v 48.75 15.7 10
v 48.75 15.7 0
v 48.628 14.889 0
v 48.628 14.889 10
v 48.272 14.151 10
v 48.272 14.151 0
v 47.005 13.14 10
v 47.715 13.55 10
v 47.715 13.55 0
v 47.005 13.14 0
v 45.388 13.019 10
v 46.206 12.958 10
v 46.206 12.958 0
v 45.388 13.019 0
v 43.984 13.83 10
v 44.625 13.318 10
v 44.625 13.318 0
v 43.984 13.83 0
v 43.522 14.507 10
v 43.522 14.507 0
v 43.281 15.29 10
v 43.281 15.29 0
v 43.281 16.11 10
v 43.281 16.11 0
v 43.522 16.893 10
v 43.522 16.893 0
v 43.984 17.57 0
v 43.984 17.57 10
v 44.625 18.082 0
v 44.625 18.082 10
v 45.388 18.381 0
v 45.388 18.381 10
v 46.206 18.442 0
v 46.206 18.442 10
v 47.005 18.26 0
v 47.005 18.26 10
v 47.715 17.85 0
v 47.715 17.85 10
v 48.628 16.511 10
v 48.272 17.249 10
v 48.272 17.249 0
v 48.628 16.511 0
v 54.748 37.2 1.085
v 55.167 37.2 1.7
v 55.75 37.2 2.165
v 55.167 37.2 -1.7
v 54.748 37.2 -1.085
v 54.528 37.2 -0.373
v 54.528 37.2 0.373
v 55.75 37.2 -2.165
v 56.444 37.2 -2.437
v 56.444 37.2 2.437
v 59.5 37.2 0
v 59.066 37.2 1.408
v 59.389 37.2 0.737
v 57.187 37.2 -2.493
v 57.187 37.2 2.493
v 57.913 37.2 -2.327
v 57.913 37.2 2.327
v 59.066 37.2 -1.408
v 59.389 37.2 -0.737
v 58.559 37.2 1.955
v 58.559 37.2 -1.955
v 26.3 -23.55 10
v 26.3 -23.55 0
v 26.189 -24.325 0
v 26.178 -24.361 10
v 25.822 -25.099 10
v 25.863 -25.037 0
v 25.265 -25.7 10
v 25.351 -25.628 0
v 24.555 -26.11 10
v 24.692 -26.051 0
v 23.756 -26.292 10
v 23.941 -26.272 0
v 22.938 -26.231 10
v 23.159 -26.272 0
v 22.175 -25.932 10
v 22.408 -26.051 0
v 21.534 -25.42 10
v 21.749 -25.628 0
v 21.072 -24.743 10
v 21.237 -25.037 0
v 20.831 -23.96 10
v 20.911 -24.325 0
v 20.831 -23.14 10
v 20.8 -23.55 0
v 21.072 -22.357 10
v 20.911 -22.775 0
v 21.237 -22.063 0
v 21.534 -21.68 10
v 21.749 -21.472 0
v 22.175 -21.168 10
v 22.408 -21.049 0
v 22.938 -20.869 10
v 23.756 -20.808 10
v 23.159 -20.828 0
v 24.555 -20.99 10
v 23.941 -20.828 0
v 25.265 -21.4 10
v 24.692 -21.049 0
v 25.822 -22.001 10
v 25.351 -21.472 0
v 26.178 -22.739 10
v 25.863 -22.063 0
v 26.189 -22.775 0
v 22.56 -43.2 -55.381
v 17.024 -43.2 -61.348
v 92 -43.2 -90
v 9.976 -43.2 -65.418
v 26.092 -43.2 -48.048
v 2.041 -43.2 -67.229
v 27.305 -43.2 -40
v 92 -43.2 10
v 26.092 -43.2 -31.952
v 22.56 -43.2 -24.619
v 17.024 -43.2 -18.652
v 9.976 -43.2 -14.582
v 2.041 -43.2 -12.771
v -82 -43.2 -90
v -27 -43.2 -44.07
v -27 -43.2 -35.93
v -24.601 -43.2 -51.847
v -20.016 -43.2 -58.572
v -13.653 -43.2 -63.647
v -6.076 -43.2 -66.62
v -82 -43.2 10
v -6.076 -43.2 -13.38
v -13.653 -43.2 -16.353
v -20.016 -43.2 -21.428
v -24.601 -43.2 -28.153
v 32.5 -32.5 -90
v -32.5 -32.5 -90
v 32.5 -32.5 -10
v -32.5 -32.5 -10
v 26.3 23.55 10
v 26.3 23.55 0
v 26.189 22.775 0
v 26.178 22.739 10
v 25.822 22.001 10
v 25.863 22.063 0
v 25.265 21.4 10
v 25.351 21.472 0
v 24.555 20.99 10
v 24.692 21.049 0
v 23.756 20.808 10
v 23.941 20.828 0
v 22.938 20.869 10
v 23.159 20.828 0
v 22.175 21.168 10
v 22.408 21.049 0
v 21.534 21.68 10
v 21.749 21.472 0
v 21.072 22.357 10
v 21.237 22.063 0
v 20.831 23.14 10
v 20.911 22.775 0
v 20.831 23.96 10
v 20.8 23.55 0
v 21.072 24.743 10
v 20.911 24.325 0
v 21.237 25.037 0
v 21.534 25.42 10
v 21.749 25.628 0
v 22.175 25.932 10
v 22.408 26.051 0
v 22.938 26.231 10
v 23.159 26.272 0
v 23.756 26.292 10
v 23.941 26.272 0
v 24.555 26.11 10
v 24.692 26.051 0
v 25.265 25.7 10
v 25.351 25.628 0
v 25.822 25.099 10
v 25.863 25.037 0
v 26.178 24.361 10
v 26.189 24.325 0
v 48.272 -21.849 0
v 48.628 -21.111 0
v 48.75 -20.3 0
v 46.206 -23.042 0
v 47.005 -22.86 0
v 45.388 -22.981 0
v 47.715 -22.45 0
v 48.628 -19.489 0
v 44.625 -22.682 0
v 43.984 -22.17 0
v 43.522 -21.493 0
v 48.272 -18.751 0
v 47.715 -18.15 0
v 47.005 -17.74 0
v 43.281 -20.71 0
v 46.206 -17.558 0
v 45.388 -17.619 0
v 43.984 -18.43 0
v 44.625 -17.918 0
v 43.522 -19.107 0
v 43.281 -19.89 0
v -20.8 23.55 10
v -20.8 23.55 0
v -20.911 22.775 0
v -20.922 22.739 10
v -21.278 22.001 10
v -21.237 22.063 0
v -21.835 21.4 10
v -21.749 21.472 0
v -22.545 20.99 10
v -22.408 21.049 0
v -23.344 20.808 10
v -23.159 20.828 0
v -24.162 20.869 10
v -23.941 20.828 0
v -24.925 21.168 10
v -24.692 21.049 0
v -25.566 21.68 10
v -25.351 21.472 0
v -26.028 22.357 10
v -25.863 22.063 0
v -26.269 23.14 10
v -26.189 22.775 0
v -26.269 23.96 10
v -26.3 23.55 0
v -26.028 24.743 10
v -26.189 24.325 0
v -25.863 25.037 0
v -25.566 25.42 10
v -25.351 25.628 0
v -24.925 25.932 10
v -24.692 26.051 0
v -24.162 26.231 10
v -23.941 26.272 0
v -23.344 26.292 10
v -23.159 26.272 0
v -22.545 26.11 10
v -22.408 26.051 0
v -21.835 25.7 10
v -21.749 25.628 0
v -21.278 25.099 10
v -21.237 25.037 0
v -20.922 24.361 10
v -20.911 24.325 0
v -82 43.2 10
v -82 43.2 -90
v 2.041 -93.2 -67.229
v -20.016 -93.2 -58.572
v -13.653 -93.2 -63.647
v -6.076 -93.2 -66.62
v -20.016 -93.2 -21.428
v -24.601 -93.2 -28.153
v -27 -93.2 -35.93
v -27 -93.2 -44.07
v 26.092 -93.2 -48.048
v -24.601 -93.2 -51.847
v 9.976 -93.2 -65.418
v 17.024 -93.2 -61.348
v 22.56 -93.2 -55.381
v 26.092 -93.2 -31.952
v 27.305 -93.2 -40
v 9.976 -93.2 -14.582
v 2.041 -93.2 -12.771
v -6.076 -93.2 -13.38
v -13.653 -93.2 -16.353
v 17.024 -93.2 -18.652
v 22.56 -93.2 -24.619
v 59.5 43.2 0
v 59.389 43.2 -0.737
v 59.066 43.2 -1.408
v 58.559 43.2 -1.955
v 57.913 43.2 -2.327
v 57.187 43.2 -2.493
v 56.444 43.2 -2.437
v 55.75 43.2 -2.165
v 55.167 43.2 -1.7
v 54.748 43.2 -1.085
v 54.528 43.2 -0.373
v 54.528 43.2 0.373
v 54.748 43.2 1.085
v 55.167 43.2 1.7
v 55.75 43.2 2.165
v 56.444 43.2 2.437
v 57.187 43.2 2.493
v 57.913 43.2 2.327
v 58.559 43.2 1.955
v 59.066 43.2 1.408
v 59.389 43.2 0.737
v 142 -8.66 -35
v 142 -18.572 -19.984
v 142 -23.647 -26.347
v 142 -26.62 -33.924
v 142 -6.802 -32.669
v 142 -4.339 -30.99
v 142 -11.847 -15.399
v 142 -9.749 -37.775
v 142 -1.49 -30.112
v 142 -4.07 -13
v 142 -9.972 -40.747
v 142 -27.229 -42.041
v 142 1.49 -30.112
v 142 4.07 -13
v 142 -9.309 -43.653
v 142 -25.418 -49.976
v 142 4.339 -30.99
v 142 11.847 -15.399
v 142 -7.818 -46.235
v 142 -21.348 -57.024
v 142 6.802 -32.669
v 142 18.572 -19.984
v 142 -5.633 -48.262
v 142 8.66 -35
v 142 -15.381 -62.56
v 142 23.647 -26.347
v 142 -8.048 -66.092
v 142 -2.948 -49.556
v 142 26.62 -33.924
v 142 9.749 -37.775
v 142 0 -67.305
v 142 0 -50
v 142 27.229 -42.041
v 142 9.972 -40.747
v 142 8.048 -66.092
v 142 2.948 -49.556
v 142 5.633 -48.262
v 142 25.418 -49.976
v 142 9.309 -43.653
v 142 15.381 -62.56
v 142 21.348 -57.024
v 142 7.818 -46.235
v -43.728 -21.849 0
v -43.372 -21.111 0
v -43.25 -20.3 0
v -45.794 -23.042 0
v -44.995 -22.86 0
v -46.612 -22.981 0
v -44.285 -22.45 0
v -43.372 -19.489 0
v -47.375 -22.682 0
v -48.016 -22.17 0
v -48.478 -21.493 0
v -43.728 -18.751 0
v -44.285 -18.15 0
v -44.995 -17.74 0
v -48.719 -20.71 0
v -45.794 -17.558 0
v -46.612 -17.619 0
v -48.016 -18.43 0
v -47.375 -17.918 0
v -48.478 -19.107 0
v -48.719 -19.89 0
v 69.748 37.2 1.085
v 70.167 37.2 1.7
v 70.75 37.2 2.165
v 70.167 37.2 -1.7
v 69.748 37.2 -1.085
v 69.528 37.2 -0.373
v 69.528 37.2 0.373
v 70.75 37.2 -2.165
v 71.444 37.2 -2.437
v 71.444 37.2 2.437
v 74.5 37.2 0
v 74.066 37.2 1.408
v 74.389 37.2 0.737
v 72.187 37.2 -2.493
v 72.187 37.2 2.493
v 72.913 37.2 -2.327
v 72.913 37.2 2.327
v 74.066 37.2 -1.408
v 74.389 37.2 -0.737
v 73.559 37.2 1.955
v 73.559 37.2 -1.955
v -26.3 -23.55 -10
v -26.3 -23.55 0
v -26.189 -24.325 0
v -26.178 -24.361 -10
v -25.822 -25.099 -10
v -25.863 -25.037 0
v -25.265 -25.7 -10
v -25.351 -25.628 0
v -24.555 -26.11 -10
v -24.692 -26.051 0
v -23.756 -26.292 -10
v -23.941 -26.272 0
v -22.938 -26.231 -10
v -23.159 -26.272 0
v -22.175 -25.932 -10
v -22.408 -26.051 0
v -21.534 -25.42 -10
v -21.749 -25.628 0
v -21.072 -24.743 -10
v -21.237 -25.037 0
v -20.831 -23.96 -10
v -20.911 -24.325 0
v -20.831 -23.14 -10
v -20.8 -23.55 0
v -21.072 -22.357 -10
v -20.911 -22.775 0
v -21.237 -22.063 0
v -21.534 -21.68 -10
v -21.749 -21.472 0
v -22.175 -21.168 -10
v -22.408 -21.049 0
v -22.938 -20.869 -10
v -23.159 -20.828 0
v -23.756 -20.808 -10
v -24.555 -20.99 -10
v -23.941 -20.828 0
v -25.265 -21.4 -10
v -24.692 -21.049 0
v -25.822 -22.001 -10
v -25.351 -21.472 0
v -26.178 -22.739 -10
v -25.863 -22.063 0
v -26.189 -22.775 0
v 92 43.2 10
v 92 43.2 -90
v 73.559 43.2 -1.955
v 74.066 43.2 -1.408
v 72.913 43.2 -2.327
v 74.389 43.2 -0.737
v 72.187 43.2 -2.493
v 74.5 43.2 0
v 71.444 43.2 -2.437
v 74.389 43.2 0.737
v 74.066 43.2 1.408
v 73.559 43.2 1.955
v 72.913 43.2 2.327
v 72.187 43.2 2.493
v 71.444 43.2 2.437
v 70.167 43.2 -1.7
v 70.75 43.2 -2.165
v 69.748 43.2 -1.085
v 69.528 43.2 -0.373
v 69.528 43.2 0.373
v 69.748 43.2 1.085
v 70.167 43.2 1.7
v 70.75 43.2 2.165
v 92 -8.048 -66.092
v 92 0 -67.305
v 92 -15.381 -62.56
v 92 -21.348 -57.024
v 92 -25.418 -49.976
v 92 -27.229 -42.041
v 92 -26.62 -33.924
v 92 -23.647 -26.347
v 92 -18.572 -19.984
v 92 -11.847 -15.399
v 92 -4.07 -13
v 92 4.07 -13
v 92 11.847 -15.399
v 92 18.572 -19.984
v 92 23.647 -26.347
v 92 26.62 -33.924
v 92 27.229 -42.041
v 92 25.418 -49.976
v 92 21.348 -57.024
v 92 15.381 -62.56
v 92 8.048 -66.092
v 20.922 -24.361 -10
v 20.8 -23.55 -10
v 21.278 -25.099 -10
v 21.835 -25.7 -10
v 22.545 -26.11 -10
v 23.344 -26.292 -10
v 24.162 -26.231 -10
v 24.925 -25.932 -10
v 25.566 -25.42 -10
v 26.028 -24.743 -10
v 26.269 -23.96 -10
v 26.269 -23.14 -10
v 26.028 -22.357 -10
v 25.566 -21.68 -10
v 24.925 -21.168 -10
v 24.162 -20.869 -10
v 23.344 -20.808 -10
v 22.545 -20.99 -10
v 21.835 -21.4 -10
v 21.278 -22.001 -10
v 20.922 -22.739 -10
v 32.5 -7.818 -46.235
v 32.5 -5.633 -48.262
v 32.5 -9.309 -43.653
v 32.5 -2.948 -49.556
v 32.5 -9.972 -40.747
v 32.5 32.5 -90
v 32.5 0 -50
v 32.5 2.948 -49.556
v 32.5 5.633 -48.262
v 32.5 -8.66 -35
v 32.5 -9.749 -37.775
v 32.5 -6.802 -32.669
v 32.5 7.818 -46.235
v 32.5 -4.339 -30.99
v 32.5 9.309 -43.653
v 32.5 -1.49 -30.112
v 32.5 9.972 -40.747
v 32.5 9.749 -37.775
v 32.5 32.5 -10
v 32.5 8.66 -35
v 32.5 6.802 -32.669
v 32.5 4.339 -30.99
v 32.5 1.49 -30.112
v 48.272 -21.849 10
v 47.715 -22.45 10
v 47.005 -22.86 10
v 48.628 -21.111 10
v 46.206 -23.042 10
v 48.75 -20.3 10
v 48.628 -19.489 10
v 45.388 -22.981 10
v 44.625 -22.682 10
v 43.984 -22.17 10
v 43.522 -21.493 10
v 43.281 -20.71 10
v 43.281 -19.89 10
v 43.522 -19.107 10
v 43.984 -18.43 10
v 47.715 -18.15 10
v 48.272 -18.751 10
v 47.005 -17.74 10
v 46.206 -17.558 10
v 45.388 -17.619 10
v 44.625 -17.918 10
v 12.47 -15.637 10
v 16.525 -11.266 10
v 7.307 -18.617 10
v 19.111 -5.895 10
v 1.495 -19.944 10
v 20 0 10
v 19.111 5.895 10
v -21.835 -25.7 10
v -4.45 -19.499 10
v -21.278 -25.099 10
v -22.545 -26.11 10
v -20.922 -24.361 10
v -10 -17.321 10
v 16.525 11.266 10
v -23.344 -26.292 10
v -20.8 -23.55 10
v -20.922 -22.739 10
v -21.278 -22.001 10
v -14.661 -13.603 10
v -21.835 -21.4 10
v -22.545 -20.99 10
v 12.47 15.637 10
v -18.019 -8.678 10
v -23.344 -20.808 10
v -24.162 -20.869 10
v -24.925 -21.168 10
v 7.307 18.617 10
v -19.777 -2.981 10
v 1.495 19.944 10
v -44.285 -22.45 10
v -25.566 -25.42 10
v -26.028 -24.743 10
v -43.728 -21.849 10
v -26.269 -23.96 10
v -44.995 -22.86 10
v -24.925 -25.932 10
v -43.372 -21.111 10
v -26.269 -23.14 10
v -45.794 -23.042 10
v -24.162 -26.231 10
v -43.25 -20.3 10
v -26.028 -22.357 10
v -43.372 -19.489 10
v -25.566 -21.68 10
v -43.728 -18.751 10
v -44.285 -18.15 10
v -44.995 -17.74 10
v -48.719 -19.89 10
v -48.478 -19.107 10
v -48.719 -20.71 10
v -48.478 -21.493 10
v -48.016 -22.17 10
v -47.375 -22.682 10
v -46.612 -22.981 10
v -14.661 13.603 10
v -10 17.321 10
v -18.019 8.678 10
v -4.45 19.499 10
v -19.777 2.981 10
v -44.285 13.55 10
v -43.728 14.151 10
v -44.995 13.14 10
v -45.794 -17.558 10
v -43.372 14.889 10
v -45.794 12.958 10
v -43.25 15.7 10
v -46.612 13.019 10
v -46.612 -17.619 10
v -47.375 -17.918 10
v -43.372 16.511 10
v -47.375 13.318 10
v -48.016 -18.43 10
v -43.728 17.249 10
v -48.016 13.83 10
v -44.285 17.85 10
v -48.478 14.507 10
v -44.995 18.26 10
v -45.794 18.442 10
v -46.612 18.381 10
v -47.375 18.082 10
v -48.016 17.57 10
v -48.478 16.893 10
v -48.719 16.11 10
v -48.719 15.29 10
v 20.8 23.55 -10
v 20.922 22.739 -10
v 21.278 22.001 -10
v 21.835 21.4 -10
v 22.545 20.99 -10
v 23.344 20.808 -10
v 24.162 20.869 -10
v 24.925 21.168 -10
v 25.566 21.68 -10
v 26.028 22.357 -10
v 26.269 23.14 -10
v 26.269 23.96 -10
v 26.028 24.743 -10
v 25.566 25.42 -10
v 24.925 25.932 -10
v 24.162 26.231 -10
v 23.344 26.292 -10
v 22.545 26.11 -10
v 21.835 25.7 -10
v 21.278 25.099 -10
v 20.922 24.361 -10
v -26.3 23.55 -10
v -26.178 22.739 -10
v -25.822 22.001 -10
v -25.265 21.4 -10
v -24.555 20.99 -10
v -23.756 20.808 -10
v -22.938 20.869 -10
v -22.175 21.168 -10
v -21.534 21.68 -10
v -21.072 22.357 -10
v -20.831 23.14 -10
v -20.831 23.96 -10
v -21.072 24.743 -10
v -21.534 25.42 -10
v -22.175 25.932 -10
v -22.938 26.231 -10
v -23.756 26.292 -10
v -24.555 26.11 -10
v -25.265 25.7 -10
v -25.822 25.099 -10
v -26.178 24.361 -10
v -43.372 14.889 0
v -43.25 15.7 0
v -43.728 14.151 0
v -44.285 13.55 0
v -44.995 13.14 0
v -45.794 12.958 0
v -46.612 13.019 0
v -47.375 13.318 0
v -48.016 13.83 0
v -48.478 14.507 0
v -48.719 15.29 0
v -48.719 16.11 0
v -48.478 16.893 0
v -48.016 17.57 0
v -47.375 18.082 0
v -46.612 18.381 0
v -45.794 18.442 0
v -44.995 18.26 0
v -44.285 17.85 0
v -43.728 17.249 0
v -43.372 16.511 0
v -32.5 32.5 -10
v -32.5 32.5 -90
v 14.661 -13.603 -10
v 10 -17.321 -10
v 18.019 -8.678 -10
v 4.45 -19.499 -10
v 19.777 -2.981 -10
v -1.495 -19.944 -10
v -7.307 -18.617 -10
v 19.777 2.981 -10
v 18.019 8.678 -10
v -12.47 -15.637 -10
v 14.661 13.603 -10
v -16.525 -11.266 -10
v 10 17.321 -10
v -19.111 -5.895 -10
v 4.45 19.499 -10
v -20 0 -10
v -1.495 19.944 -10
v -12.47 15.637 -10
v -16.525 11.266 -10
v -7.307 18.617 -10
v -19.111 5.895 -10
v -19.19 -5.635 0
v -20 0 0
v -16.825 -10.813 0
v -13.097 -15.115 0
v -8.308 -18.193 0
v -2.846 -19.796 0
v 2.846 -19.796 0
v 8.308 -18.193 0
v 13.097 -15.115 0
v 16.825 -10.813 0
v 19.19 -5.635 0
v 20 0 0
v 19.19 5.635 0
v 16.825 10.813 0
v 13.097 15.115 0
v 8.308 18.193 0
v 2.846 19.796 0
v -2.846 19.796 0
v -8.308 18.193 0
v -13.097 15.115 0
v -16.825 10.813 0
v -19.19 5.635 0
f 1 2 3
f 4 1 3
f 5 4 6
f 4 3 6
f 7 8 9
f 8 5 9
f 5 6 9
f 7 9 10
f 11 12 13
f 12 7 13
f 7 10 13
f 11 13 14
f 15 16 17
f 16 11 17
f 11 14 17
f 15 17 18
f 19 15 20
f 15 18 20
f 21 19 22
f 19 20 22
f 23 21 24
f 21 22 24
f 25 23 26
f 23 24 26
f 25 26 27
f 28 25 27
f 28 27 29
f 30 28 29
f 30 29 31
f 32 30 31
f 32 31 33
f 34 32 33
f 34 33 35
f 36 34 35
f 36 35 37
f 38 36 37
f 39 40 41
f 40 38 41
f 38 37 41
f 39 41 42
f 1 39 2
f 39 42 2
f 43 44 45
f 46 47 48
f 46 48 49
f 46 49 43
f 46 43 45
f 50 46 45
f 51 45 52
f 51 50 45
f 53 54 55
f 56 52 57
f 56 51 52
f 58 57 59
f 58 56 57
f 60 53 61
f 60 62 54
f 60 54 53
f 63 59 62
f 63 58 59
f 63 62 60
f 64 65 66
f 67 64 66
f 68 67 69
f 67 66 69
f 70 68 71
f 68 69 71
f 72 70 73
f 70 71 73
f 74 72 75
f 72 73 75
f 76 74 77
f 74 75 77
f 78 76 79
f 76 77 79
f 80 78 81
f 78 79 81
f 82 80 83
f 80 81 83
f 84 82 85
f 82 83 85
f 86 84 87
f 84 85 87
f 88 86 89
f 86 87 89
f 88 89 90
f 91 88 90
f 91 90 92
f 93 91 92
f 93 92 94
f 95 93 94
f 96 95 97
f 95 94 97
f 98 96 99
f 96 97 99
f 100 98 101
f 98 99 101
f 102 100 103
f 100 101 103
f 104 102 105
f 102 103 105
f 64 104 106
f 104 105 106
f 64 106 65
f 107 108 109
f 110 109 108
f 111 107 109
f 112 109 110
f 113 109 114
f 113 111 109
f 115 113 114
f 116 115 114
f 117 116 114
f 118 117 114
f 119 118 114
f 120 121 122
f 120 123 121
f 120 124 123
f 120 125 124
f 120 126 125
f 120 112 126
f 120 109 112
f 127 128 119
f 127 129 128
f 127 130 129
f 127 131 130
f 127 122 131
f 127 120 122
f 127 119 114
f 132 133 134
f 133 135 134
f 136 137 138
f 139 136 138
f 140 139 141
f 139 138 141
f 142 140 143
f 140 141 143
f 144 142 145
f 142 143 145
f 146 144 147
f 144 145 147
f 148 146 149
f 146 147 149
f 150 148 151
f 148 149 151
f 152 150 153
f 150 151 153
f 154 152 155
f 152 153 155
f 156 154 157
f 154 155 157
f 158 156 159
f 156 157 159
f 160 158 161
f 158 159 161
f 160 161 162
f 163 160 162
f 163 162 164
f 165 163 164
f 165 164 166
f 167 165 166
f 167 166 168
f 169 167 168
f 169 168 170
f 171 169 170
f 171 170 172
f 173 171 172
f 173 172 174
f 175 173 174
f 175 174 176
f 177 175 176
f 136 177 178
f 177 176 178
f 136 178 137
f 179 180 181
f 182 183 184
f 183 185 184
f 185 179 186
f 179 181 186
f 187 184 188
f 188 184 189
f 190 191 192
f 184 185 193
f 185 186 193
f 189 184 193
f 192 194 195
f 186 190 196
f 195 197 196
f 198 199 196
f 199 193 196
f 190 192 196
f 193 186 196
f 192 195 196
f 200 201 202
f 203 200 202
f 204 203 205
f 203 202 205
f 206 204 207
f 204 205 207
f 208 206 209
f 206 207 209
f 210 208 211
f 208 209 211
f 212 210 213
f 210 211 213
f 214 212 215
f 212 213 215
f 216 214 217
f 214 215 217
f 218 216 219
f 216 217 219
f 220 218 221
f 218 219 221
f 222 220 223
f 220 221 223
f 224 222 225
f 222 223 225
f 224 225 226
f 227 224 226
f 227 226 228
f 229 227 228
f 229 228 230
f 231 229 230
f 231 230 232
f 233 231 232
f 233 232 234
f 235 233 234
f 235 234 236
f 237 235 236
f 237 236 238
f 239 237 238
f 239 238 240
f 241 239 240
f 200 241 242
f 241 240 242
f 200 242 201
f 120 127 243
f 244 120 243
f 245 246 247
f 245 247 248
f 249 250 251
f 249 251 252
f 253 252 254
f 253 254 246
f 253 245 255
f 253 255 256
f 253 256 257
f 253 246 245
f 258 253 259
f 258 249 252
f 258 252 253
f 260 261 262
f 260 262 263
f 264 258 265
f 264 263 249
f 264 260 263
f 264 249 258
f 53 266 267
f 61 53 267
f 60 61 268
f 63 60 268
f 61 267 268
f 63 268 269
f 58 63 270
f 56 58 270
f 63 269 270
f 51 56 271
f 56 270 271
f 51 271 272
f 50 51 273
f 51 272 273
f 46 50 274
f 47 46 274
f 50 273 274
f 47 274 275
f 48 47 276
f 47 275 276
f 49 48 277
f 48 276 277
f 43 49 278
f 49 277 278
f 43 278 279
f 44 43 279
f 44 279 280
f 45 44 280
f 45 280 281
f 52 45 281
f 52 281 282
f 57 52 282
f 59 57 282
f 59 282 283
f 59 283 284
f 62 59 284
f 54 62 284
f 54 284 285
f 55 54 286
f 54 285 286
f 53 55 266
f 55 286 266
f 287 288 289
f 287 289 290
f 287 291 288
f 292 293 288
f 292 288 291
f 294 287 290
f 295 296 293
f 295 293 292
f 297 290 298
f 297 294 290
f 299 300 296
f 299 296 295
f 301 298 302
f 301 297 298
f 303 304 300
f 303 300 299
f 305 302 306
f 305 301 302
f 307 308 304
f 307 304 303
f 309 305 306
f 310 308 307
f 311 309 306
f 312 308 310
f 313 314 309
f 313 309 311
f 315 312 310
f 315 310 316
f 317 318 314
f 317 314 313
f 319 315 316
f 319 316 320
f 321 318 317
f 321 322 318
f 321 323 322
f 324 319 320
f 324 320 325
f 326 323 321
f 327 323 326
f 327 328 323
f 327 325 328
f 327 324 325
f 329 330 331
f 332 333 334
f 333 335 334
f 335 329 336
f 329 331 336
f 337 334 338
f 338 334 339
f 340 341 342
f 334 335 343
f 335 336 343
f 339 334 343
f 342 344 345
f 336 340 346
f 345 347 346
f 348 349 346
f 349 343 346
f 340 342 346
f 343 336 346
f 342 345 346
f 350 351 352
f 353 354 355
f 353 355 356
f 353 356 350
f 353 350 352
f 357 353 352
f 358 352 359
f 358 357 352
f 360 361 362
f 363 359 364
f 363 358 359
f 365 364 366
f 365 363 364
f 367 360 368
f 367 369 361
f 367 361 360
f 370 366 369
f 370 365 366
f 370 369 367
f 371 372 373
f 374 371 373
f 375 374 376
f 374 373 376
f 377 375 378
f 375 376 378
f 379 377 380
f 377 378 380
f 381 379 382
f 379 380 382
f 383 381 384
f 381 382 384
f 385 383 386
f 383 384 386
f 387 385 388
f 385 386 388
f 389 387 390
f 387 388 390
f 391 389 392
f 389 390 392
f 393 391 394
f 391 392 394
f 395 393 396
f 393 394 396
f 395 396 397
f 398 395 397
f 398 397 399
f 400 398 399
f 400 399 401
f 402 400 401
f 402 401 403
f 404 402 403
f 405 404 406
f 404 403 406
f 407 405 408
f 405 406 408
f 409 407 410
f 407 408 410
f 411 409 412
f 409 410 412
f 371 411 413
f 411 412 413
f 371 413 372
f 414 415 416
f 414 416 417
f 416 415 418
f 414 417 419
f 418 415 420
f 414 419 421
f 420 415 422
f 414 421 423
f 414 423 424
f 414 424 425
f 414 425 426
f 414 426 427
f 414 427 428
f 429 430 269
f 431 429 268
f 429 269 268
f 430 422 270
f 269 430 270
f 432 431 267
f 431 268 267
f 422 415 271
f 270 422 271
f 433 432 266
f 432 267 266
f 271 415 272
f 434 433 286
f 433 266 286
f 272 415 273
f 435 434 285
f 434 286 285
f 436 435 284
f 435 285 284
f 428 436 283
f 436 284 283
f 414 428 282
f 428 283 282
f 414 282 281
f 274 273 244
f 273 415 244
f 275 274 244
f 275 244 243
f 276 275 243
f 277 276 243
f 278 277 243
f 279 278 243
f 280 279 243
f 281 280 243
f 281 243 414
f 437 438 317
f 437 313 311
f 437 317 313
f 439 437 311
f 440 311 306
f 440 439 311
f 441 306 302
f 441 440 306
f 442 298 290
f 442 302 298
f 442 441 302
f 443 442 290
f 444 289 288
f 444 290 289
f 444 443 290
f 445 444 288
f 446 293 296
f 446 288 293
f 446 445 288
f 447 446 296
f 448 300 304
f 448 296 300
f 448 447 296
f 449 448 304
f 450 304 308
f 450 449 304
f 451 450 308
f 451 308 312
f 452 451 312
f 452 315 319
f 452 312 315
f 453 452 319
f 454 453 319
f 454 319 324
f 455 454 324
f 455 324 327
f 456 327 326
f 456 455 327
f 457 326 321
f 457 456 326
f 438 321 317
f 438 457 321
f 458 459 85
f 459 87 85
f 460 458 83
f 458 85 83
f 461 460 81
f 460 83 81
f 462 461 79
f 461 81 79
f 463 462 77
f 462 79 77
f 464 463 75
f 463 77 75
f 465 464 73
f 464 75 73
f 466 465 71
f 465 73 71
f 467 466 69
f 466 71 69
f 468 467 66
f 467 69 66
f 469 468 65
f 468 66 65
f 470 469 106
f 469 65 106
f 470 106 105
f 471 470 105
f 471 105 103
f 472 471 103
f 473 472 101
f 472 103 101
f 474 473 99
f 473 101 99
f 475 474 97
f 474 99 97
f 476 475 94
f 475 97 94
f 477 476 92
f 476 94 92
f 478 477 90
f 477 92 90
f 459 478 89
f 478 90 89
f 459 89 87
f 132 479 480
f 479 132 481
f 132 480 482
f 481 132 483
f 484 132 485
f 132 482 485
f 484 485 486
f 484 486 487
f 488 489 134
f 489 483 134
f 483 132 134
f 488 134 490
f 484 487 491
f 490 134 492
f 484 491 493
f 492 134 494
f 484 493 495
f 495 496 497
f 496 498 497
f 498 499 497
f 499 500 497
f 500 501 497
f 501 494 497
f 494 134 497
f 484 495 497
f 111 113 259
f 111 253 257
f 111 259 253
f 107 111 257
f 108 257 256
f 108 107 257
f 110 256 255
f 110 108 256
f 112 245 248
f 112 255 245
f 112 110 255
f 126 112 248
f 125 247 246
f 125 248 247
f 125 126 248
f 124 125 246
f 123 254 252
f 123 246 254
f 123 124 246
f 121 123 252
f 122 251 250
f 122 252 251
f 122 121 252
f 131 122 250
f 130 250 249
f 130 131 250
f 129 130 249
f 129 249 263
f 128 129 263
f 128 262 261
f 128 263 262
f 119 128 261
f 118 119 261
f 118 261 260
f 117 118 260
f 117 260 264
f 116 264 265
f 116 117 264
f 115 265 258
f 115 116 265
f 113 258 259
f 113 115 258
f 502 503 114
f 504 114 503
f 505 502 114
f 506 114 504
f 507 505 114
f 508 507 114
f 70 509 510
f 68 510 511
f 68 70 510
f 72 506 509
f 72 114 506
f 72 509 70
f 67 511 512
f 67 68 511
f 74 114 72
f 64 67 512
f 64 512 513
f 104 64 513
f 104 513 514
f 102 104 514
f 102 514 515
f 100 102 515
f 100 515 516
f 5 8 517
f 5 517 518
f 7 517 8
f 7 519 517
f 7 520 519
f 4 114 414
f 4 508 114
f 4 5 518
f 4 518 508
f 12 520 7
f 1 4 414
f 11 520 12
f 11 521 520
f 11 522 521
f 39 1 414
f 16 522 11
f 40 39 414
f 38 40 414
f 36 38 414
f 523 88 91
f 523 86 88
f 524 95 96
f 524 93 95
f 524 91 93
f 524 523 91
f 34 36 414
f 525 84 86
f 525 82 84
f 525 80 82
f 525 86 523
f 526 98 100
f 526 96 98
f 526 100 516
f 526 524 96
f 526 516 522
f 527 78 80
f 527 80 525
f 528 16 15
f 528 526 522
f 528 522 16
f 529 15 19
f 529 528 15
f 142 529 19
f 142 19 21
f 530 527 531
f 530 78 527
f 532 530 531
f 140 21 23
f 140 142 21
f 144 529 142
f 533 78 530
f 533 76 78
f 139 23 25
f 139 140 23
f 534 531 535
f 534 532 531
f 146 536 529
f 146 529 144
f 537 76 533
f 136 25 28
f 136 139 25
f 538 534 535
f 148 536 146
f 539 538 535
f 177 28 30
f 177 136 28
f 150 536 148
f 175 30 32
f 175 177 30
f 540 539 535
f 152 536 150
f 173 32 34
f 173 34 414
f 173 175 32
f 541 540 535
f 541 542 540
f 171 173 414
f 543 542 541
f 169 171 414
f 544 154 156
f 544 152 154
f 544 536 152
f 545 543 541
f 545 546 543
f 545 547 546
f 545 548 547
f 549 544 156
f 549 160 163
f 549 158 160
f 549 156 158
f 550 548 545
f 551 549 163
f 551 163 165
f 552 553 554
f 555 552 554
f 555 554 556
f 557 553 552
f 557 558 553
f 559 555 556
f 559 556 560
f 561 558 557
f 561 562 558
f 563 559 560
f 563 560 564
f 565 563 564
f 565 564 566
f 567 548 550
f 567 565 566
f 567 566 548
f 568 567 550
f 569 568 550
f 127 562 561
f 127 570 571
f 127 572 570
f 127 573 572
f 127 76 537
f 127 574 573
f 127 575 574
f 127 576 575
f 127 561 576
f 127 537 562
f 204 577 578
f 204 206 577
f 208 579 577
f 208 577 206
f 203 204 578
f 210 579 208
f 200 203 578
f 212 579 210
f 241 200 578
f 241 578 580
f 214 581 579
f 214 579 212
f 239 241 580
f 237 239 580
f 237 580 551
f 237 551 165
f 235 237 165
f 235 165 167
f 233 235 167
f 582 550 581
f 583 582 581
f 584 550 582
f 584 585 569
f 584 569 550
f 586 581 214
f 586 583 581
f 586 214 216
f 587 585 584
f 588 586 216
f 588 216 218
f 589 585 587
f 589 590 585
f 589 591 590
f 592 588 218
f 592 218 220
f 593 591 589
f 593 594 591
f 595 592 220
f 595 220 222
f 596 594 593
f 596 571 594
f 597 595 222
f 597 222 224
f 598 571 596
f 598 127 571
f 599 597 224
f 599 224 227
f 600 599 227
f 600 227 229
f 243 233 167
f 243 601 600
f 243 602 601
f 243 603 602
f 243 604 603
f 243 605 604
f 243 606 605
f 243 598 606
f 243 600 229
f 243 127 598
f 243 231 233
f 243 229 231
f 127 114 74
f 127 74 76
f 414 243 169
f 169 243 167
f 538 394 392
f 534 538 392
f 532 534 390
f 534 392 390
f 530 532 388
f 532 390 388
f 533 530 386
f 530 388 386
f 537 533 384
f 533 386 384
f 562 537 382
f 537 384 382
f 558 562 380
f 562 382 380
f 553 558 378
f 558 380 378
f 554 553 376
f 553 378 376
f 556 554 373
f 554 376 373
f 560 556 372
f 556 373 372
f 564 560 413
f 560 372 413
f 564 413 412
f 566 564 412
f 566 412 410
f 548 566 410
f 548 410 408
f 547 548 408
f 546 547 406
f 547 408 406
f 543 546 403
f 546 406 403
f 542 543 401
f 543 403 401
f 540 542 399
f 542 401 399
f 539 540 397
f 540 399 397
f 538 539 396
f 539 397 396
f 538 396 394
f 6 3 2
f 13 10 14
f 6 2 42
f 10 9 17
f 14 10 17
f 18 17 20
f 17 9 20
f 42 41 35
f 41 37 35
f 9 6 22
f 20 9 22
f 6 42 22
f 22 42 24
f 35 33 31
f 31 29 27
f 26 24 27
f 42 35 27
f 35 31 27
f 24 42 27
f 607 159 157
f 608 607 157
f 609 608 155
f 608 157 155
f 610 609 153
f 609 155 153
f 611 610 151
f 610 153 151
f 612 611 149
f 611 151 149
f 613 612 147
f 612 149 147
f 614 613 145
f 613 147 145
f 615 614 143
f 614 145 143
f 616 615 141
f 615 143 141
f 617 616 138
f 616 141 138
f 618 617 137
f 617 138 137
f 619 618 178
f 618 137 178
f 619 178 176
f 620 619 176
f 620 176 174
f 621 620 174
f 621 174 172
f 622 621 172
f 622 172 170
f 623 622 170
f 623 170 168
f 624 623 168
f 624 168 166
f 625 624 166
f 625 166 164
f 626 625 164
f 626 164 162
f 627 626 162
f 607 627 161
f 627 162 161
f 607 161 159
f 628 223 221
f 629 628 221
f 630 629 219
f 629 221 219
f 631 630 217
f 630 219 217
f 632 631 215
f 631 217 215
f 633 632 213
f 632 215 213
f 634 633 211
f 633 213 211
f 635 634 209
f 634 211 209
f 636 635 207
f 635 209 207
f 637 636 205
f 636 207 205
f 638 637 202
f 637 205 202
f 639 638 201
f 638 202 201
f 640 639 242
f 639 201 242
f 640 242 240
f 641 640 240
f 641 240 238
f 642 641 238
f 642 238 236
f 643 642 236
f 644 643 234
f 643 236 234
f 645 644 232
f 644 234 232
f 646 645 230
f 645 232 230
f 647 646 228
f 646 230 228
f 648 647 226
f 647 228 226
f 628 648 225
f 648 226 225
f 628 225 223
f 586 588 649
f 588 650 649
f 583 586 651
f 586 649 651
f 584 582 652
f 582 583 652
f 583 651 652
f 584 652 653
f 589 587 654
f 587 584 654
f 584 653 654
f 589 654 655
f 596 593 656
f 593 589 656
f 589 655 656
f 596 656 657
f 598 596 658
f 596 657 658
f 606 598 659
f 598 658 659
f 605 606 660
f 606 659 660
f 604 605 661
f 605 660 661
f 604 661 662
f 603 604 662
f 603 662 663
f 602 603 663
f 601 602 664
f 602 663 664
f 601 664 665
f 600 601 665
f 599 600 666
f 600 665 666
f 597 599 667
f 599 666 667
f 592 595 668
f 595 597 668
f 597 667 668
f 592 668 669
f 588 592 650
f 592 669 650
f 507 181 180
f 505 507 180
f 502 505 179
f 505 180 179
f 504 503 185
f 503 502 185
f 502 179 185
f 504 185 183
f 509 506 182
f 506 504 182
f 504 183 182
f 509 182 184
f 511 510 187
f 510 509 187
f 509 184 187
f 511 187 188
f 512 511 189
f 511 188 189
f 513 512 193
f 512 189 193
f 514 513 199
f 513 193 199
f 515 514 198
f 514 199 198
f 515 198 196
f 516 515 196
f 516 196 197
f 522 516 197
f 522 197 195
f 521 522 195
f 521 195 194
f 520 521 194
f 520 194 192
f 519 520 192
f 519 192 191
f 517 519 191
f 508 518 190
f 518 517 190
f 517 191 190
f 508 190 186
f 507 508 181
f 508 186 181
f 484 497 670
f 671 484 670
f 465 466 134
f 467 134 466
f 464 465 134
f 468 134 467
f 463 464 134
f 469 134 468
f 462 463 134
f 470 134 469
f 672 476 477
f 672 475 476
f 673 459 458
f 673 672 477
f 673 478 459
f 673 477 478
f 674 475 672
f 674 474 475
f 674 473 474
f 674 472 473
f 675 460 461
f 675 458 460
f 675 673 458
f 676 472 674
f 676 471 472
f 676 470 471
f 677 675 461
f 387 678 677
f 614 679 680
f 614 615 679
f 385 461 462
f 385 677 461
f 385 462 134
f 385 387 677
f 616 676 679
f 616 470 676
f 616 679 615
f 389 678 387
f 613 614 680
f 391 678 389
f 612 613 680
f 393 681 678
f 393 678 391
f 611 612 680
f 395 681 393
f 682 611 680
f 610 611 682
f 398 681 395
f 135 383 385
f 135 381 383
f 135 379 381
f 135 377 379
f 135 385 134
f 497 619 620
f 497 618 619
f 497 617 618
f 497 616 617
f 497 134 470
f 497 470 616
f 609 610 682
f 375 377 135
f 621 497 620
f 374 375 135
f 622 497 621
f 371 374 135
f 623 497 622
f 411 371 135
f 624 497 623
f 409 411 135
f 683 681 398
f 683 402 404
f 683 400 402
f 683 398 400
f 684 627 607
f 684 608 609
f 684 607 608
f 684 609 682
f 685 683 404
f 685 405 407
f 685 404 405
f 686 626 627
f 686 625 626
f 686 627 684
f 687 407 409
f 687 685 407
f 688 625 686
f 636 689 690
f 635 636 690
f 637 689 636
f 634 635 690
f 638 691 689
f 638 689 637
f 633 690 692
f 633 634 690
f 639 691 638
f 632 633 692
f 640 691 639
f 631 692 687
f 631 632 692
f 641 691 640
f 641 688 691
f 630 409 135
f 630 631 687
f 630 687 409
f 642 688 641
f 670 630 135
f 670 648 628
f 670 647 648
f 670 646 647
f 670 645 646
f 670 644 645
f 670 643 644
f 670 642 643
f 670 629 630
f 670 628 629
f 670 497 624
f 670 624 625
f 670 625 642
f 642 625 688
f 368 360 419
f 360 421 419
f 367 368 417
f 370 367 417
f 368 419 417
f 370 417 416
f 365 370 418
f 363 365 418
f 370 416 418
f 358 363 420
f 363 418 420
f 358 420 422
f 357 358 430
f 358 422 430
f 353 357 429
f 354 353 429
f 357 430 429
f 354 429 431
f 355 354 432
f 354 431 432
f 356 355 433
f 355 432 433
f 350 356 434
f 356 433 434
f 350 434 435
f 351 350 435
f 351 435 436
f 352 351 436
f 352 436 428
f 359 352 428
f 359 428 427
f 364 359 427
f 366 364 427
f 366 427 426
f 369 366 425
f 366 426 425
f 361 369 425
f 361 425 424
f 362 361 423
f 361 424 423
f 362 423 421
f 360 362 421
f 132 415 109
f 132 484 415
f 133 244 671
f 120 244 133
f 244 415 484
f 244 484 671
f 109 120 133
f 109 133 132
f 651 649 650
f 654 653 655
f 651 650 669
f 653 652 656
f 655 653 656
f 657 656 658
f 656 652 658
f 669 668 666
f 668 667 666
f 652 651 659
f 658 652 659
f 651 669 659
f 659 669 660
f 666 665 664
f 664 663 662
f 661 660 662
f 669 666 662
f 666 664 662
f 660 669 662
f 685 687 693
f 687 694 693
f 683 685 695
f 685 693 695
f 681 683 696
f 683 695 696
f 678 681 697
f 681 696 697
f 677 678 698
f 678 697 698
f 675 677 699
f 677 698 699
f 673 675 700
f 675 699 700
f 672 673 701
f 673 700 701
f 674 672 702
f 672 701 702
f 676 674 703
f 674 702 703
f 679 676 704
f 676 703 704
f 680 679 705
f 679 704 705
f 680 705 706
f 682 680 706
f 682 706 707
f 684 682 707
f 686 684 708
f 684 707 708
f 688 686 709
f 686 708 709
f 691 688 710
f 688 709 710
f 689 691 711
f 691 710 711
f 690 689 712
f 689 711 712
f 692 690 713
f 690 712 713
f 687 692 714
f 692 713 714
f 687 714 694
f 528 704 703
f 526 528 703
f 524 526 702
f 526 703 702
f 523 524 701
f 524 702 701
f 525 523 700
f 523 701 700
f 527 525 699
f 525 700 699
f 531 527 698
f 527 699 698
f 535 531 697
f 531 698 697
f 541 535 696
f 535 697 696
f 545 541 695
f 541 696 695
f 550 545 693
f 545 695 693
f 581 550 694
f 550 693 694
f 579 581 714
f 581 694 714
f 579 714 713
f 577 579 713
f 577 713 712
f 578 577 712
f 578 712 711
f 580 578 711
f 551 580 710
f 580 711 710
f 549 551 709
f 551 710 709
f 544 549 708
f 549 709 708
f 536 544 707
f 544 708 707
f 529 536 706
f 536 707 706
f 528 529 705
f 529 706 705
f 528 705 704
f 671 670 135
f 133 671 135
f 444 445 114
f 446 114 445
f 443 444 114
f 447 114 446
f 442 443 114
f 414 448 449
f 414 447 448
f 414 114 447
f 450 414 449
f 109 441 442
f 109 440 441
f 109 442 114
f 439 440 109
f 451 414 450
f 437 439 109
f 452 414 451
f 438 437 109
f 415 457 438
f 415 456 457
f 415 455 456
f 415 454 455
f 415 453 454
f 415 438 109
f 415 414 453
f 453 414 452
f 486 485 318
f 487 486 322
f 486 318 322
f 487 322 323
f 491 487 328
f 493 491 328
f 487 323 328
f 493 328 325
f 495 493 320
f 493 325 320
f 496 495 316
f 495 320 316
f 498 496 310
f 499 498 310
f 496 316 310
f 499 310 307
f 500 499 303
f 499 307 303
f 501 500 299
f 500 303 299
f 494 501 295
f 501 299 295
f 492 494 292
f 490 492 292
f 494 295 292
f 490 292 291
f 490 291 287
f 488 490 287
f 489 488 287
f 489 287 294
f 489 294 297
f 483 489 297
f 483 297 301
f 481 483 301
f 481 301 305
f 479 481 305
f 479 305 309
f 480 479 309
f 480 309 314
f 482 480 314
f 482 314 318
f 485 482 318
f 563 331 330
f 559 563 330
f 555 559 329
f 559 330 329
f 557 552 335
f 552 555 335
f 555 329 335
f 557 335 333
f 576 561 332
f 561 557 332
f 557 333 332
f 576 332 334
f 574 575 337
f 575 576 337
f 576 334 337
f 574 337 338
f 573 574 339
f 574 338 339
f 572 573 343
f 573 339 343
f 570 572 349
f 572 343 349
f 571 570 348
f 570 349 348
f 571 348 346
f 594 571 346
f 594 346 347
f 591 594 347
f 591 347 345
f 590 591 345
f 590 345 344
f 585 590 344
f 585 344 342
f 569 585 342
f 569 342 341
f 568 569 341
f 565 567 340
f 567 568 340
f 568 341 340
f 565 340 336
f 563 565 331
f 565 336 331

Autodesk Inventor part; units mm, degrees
ref_plane "YZ Plane" through (0, 0, 0) normal (1, 0, 0) x (0, 1, 0)
ref_plane "XZ Plane" through (0, 0, 0) normal (0, 1, 0) x (-1, 0, 0)
ref_plane "XY Plane" through (0, 0, 0) normal (0, 0, 1) x (1, 0, 0)
sketch "Sketch1" plane through (0, 0, 0) normal (0, 0, 1) x (1, 0, 0)
  line L0 (-23.55, 23.55) -> (23.55, 23.55) construction
  line L1 (23.55, 23.55) -> (23.55, -23.55) construction
  line L2 (23.55, -23.55) -> (-23.55, -23.55) construction
  line L3 (-23.55, -23.55) -> (-23.55, 23.55) construction
  line L4 (0, 23.55) -> (0, -23.55) construction
  line L5 (-23.55, 0) -> (23.55, 0) construction
  circle A0 centre (-23.55, 23.55) radius 2.75
  circle A1 centre (23.55, 23.55) radius 2.75
  circle A2 centre (-23.55, -23.55) radius 2.75
  circle A3 centre (23.55, -23.55) radius 2.75
  circle A4 centre (0, 0) radius 20
  line L6 (-28.2, 28.2) -> (28.2, 28.2) construction
  line L7 (28.2, 28.2) -> (28.2, -28.2) construction
  line L8 (28.2, -28.2) -> (-28.2, -28.2) construction
  line L9 (-28.2, -28.2) -> (-28.2, 28.2) construction
  line L10 (-28.2, 0) -> (28.2, 0) construction
  line L11 (0, -28.2) -> (0, 28.2) construction
  line L12 (-60, 21.2) -> (-32, 21.2) construction
  line L13 (-32, 21.2) -> (-32, -25.8) construction
  line L14 (-32, -25.8) -> (-60, -25.8) construction
  line L15 (-60, -25.8) -> (-60, 21.2) construction
  line L16 (-46, 21.2) -> (-46, -25.8) construction
  line L17 (-60, -2.3) -> (-32, -2.3) construction
  circle A5 centre (-46, 15.7) radius 2.75
  circle A6 centre (-46, -20.3) radius 2.75
  line L18 (60, 21.2) -> (32, 21.2) construction
  line L19 (32, 21.2) -> (32, -25.8) construction
  line L20 (32, -25.8) -> (60, -25.8) construction
  line L21 (60, -25.8) -> (60, 21.2) construction
  line L22 (46, 21.2) -> (46, -25.8) construction
  line L23 (60, -2.3) -> (32, -2.3) construction
  circle A7 centre (46, 15.7) radius 2.75
  circle A8 centre (46, -20.3) radius 2.75
  line L24 (-82, 43.2) -> (82, 43.2)
  line L25 (82, 43.2) -> (82, -43.2)
  line L26 (82, -43.2) -> (-82, -43.2)
  line L27 (-82, -43.2) -> (-82, 43.2)
  point P0 (0, 0)
  dimension "d0" = 47.1
  dimension "d1" = 47.1
  dimension "d2" = 5.5
  dimension "d4" = 40
  dimension "d5" = 56.4
  dimension "d6" = 56.4
  dimension "d9" = 46
  dimension "d10" = 47
  dimension "d11" = 28
  dimension "d12" = 5.5
  dimension "d13" = 36
  dimension "d14" = 22
  dimension "d15" = 15
  dimension "d18" = 2.3
extrude "Extrusion1" add sketch "Sketch1" along normal blind 10
sketch "Sketch2" plane through (0, 0, 0) normal (0, 0, -1) x (-1, 0, 0)
  line L0 (32.5, -32.5) -> (-32.5, -32.5)
  line L1 (-32.5, -32.5) -> (-32.5, 32.5)
  line L2 (-32.5, 32.5) -> (32.5, 32.5)
  line L3 (32.5, 32.5) -> (32.5, -32.5)
  line L4 (0, 32.5) -> (0, -32.5) construction
  line L5 (-32.5, 0) -> (32.5, 0) construction
  line L6 (-82, -43.2) -> (-82, 43.2) projected
  line L7 (82, -43.2) -> (-82, -43.2) projected
  line L8 (-82, 43.2) -> (82, 43.2)
  line L9 (82, 43.2) -> (82, -43.2)
  line L10 (82, -43.2) -> (-82, -43.2)
  line L11 (-82, -43.2) -> (-82, 43.2)
  point P0 (0, 0)
  point P1 (0, 0)
  dimension "d19" = 65
  dimension "d20" = 65
extrude "Extrusion2" add sketch "Sketch2" along normal blind 90
sketch "Sketch3" plane through (0, 0, 0) normal (0, 0, -1) x (-1, 0, 0)
  line L0 (32.5, -32.5) -> (32.5, 32.5) projected
  line L1 (32.5, 32.5) -> (-32.5, 32.5) projected
  line L2 (-32.5, 32.5) -> (-32.5, -32.5) projected
  line L3 (-32.5, -32.5) -> (32.5, -32.5) projected
  circle A0 centre (23.55, 23.55) radius 2.75 projected
  circle A1 centre (-23.55, 23.55) radius 2.75 projected
  circle A2 centre (23.55, -23.55) radius 2.75 projected
  circle A3 centre (-23.55, -23.55) radius 2.75 projected
  circle A4 centre (0, 0) radius 20 projected
extrude "Extrusion3" add sketch "Sketch3" along normal blind 10
sketch "Sketch8" plane through (82, -43.2, 10) normal (1, 0, 0) x (0, 0, -1)
  line L0 (100, 86.4) -> (0, 86.4) projected
  line L1 (0, 0) -> (0, 86.4) projected
  line L2 (100, 0) -> (0, 0) projected
  line L3 (100, 86.4) -> (100, 0) projected
  point P0 (10, 43.2)
extrude "Extrusion8" add sketch "Sketch8" along normal blind 10
sketch "Sketch9" plane through (92, -43.2, 10) normal (1, 0, 0) x (0, 0, -1)
  line L0 (100, 86.4) -> (0, 86.4) construction
  line L1 (50, 86.4) -> (50, 0) construction
  line L2 (0, 0) -> (100, 0) construction
  line L3 (100, 75.7) -> (100, 10.7) construction
  line L4 (100, 43.2) -> (0, 43.2) construction
  line L5 (0, 23.2) -> (0, 63.2) construction
  circle A0 centre (50, 43.2) radius 27.305
  point P0 (10, 43.2)
  dimension "d38" = 54.61
extrude "Extrusion9" add sketch "Sketch9" along normal blind 50
sketch "Sketch10" plane through (-82, -43.2, -90) normal (0, -1, 0) x (1, 0, 0)
  line L0 (0, 0) -> (0, 100) construction
  line L1 (0, 50) -> (174, 50) construction
  line L2 (174, 100) -> (174, 0) construction
  line L3 (62, 100) -> (102, 100) construction
  line L4 (82, 100) -> (82, 0) construction
  line L5 (49.5, 0) -> (114.5, 0) construction
  circle A0 centre (82, 50) radius 27.305
  point P0 (82, 90)
  dimension "d41" = 54.61
extrude "Extrusion10" add sketch "Sketch10" along normal blind 50
sketch "Sketch11" plane through (142, 0, -40) normal (1, 0, 0) x (0, 0, -1)
  circle A0 centre (0, 0) radius 27.305 construction
  circle A1 centre (0, 0) radius 10
  point P0 (-40, 0)
  dimension "d44" = 20
extrude "Extrusion11" cut sketch "Sketch11" against normal up to surface (109.5 mm away)
sketch "Sketch12" plane through (-82, 43.2, 10) normal (0, 1, 0) x (1, 0, 0)
  line L0 (174, 100) -> (174, 0) construction
  line L1 (174, 0) -> (154, 0) construction
  line L2 (154, 0) -> (154, 10) construction
  line L3 (154, 10) -> (174, 10) construction
  line L4 (174, 10) -> (174, 0) construction
  line L5 (154, 10) -> (139, 10) construction
  line L6 (139, 10) -> (139, 0) construction
  line L7 (0, 0) -> (174, 0) construction
  circle A0 centre (154, 10) radius 2.5
  circle A1 centre (139, 10) radius 2.5
  point P0 (82, 10)
  dimension "d47" = 20
  dimension "d48" = 10
  dimension "d49" = 15
  dimension "d50" = 5
  dimension "d51" = 5
extrude "Extrusion12" cut sketch "Sketch12" against normal blind 6
properties part number "driver_L"
